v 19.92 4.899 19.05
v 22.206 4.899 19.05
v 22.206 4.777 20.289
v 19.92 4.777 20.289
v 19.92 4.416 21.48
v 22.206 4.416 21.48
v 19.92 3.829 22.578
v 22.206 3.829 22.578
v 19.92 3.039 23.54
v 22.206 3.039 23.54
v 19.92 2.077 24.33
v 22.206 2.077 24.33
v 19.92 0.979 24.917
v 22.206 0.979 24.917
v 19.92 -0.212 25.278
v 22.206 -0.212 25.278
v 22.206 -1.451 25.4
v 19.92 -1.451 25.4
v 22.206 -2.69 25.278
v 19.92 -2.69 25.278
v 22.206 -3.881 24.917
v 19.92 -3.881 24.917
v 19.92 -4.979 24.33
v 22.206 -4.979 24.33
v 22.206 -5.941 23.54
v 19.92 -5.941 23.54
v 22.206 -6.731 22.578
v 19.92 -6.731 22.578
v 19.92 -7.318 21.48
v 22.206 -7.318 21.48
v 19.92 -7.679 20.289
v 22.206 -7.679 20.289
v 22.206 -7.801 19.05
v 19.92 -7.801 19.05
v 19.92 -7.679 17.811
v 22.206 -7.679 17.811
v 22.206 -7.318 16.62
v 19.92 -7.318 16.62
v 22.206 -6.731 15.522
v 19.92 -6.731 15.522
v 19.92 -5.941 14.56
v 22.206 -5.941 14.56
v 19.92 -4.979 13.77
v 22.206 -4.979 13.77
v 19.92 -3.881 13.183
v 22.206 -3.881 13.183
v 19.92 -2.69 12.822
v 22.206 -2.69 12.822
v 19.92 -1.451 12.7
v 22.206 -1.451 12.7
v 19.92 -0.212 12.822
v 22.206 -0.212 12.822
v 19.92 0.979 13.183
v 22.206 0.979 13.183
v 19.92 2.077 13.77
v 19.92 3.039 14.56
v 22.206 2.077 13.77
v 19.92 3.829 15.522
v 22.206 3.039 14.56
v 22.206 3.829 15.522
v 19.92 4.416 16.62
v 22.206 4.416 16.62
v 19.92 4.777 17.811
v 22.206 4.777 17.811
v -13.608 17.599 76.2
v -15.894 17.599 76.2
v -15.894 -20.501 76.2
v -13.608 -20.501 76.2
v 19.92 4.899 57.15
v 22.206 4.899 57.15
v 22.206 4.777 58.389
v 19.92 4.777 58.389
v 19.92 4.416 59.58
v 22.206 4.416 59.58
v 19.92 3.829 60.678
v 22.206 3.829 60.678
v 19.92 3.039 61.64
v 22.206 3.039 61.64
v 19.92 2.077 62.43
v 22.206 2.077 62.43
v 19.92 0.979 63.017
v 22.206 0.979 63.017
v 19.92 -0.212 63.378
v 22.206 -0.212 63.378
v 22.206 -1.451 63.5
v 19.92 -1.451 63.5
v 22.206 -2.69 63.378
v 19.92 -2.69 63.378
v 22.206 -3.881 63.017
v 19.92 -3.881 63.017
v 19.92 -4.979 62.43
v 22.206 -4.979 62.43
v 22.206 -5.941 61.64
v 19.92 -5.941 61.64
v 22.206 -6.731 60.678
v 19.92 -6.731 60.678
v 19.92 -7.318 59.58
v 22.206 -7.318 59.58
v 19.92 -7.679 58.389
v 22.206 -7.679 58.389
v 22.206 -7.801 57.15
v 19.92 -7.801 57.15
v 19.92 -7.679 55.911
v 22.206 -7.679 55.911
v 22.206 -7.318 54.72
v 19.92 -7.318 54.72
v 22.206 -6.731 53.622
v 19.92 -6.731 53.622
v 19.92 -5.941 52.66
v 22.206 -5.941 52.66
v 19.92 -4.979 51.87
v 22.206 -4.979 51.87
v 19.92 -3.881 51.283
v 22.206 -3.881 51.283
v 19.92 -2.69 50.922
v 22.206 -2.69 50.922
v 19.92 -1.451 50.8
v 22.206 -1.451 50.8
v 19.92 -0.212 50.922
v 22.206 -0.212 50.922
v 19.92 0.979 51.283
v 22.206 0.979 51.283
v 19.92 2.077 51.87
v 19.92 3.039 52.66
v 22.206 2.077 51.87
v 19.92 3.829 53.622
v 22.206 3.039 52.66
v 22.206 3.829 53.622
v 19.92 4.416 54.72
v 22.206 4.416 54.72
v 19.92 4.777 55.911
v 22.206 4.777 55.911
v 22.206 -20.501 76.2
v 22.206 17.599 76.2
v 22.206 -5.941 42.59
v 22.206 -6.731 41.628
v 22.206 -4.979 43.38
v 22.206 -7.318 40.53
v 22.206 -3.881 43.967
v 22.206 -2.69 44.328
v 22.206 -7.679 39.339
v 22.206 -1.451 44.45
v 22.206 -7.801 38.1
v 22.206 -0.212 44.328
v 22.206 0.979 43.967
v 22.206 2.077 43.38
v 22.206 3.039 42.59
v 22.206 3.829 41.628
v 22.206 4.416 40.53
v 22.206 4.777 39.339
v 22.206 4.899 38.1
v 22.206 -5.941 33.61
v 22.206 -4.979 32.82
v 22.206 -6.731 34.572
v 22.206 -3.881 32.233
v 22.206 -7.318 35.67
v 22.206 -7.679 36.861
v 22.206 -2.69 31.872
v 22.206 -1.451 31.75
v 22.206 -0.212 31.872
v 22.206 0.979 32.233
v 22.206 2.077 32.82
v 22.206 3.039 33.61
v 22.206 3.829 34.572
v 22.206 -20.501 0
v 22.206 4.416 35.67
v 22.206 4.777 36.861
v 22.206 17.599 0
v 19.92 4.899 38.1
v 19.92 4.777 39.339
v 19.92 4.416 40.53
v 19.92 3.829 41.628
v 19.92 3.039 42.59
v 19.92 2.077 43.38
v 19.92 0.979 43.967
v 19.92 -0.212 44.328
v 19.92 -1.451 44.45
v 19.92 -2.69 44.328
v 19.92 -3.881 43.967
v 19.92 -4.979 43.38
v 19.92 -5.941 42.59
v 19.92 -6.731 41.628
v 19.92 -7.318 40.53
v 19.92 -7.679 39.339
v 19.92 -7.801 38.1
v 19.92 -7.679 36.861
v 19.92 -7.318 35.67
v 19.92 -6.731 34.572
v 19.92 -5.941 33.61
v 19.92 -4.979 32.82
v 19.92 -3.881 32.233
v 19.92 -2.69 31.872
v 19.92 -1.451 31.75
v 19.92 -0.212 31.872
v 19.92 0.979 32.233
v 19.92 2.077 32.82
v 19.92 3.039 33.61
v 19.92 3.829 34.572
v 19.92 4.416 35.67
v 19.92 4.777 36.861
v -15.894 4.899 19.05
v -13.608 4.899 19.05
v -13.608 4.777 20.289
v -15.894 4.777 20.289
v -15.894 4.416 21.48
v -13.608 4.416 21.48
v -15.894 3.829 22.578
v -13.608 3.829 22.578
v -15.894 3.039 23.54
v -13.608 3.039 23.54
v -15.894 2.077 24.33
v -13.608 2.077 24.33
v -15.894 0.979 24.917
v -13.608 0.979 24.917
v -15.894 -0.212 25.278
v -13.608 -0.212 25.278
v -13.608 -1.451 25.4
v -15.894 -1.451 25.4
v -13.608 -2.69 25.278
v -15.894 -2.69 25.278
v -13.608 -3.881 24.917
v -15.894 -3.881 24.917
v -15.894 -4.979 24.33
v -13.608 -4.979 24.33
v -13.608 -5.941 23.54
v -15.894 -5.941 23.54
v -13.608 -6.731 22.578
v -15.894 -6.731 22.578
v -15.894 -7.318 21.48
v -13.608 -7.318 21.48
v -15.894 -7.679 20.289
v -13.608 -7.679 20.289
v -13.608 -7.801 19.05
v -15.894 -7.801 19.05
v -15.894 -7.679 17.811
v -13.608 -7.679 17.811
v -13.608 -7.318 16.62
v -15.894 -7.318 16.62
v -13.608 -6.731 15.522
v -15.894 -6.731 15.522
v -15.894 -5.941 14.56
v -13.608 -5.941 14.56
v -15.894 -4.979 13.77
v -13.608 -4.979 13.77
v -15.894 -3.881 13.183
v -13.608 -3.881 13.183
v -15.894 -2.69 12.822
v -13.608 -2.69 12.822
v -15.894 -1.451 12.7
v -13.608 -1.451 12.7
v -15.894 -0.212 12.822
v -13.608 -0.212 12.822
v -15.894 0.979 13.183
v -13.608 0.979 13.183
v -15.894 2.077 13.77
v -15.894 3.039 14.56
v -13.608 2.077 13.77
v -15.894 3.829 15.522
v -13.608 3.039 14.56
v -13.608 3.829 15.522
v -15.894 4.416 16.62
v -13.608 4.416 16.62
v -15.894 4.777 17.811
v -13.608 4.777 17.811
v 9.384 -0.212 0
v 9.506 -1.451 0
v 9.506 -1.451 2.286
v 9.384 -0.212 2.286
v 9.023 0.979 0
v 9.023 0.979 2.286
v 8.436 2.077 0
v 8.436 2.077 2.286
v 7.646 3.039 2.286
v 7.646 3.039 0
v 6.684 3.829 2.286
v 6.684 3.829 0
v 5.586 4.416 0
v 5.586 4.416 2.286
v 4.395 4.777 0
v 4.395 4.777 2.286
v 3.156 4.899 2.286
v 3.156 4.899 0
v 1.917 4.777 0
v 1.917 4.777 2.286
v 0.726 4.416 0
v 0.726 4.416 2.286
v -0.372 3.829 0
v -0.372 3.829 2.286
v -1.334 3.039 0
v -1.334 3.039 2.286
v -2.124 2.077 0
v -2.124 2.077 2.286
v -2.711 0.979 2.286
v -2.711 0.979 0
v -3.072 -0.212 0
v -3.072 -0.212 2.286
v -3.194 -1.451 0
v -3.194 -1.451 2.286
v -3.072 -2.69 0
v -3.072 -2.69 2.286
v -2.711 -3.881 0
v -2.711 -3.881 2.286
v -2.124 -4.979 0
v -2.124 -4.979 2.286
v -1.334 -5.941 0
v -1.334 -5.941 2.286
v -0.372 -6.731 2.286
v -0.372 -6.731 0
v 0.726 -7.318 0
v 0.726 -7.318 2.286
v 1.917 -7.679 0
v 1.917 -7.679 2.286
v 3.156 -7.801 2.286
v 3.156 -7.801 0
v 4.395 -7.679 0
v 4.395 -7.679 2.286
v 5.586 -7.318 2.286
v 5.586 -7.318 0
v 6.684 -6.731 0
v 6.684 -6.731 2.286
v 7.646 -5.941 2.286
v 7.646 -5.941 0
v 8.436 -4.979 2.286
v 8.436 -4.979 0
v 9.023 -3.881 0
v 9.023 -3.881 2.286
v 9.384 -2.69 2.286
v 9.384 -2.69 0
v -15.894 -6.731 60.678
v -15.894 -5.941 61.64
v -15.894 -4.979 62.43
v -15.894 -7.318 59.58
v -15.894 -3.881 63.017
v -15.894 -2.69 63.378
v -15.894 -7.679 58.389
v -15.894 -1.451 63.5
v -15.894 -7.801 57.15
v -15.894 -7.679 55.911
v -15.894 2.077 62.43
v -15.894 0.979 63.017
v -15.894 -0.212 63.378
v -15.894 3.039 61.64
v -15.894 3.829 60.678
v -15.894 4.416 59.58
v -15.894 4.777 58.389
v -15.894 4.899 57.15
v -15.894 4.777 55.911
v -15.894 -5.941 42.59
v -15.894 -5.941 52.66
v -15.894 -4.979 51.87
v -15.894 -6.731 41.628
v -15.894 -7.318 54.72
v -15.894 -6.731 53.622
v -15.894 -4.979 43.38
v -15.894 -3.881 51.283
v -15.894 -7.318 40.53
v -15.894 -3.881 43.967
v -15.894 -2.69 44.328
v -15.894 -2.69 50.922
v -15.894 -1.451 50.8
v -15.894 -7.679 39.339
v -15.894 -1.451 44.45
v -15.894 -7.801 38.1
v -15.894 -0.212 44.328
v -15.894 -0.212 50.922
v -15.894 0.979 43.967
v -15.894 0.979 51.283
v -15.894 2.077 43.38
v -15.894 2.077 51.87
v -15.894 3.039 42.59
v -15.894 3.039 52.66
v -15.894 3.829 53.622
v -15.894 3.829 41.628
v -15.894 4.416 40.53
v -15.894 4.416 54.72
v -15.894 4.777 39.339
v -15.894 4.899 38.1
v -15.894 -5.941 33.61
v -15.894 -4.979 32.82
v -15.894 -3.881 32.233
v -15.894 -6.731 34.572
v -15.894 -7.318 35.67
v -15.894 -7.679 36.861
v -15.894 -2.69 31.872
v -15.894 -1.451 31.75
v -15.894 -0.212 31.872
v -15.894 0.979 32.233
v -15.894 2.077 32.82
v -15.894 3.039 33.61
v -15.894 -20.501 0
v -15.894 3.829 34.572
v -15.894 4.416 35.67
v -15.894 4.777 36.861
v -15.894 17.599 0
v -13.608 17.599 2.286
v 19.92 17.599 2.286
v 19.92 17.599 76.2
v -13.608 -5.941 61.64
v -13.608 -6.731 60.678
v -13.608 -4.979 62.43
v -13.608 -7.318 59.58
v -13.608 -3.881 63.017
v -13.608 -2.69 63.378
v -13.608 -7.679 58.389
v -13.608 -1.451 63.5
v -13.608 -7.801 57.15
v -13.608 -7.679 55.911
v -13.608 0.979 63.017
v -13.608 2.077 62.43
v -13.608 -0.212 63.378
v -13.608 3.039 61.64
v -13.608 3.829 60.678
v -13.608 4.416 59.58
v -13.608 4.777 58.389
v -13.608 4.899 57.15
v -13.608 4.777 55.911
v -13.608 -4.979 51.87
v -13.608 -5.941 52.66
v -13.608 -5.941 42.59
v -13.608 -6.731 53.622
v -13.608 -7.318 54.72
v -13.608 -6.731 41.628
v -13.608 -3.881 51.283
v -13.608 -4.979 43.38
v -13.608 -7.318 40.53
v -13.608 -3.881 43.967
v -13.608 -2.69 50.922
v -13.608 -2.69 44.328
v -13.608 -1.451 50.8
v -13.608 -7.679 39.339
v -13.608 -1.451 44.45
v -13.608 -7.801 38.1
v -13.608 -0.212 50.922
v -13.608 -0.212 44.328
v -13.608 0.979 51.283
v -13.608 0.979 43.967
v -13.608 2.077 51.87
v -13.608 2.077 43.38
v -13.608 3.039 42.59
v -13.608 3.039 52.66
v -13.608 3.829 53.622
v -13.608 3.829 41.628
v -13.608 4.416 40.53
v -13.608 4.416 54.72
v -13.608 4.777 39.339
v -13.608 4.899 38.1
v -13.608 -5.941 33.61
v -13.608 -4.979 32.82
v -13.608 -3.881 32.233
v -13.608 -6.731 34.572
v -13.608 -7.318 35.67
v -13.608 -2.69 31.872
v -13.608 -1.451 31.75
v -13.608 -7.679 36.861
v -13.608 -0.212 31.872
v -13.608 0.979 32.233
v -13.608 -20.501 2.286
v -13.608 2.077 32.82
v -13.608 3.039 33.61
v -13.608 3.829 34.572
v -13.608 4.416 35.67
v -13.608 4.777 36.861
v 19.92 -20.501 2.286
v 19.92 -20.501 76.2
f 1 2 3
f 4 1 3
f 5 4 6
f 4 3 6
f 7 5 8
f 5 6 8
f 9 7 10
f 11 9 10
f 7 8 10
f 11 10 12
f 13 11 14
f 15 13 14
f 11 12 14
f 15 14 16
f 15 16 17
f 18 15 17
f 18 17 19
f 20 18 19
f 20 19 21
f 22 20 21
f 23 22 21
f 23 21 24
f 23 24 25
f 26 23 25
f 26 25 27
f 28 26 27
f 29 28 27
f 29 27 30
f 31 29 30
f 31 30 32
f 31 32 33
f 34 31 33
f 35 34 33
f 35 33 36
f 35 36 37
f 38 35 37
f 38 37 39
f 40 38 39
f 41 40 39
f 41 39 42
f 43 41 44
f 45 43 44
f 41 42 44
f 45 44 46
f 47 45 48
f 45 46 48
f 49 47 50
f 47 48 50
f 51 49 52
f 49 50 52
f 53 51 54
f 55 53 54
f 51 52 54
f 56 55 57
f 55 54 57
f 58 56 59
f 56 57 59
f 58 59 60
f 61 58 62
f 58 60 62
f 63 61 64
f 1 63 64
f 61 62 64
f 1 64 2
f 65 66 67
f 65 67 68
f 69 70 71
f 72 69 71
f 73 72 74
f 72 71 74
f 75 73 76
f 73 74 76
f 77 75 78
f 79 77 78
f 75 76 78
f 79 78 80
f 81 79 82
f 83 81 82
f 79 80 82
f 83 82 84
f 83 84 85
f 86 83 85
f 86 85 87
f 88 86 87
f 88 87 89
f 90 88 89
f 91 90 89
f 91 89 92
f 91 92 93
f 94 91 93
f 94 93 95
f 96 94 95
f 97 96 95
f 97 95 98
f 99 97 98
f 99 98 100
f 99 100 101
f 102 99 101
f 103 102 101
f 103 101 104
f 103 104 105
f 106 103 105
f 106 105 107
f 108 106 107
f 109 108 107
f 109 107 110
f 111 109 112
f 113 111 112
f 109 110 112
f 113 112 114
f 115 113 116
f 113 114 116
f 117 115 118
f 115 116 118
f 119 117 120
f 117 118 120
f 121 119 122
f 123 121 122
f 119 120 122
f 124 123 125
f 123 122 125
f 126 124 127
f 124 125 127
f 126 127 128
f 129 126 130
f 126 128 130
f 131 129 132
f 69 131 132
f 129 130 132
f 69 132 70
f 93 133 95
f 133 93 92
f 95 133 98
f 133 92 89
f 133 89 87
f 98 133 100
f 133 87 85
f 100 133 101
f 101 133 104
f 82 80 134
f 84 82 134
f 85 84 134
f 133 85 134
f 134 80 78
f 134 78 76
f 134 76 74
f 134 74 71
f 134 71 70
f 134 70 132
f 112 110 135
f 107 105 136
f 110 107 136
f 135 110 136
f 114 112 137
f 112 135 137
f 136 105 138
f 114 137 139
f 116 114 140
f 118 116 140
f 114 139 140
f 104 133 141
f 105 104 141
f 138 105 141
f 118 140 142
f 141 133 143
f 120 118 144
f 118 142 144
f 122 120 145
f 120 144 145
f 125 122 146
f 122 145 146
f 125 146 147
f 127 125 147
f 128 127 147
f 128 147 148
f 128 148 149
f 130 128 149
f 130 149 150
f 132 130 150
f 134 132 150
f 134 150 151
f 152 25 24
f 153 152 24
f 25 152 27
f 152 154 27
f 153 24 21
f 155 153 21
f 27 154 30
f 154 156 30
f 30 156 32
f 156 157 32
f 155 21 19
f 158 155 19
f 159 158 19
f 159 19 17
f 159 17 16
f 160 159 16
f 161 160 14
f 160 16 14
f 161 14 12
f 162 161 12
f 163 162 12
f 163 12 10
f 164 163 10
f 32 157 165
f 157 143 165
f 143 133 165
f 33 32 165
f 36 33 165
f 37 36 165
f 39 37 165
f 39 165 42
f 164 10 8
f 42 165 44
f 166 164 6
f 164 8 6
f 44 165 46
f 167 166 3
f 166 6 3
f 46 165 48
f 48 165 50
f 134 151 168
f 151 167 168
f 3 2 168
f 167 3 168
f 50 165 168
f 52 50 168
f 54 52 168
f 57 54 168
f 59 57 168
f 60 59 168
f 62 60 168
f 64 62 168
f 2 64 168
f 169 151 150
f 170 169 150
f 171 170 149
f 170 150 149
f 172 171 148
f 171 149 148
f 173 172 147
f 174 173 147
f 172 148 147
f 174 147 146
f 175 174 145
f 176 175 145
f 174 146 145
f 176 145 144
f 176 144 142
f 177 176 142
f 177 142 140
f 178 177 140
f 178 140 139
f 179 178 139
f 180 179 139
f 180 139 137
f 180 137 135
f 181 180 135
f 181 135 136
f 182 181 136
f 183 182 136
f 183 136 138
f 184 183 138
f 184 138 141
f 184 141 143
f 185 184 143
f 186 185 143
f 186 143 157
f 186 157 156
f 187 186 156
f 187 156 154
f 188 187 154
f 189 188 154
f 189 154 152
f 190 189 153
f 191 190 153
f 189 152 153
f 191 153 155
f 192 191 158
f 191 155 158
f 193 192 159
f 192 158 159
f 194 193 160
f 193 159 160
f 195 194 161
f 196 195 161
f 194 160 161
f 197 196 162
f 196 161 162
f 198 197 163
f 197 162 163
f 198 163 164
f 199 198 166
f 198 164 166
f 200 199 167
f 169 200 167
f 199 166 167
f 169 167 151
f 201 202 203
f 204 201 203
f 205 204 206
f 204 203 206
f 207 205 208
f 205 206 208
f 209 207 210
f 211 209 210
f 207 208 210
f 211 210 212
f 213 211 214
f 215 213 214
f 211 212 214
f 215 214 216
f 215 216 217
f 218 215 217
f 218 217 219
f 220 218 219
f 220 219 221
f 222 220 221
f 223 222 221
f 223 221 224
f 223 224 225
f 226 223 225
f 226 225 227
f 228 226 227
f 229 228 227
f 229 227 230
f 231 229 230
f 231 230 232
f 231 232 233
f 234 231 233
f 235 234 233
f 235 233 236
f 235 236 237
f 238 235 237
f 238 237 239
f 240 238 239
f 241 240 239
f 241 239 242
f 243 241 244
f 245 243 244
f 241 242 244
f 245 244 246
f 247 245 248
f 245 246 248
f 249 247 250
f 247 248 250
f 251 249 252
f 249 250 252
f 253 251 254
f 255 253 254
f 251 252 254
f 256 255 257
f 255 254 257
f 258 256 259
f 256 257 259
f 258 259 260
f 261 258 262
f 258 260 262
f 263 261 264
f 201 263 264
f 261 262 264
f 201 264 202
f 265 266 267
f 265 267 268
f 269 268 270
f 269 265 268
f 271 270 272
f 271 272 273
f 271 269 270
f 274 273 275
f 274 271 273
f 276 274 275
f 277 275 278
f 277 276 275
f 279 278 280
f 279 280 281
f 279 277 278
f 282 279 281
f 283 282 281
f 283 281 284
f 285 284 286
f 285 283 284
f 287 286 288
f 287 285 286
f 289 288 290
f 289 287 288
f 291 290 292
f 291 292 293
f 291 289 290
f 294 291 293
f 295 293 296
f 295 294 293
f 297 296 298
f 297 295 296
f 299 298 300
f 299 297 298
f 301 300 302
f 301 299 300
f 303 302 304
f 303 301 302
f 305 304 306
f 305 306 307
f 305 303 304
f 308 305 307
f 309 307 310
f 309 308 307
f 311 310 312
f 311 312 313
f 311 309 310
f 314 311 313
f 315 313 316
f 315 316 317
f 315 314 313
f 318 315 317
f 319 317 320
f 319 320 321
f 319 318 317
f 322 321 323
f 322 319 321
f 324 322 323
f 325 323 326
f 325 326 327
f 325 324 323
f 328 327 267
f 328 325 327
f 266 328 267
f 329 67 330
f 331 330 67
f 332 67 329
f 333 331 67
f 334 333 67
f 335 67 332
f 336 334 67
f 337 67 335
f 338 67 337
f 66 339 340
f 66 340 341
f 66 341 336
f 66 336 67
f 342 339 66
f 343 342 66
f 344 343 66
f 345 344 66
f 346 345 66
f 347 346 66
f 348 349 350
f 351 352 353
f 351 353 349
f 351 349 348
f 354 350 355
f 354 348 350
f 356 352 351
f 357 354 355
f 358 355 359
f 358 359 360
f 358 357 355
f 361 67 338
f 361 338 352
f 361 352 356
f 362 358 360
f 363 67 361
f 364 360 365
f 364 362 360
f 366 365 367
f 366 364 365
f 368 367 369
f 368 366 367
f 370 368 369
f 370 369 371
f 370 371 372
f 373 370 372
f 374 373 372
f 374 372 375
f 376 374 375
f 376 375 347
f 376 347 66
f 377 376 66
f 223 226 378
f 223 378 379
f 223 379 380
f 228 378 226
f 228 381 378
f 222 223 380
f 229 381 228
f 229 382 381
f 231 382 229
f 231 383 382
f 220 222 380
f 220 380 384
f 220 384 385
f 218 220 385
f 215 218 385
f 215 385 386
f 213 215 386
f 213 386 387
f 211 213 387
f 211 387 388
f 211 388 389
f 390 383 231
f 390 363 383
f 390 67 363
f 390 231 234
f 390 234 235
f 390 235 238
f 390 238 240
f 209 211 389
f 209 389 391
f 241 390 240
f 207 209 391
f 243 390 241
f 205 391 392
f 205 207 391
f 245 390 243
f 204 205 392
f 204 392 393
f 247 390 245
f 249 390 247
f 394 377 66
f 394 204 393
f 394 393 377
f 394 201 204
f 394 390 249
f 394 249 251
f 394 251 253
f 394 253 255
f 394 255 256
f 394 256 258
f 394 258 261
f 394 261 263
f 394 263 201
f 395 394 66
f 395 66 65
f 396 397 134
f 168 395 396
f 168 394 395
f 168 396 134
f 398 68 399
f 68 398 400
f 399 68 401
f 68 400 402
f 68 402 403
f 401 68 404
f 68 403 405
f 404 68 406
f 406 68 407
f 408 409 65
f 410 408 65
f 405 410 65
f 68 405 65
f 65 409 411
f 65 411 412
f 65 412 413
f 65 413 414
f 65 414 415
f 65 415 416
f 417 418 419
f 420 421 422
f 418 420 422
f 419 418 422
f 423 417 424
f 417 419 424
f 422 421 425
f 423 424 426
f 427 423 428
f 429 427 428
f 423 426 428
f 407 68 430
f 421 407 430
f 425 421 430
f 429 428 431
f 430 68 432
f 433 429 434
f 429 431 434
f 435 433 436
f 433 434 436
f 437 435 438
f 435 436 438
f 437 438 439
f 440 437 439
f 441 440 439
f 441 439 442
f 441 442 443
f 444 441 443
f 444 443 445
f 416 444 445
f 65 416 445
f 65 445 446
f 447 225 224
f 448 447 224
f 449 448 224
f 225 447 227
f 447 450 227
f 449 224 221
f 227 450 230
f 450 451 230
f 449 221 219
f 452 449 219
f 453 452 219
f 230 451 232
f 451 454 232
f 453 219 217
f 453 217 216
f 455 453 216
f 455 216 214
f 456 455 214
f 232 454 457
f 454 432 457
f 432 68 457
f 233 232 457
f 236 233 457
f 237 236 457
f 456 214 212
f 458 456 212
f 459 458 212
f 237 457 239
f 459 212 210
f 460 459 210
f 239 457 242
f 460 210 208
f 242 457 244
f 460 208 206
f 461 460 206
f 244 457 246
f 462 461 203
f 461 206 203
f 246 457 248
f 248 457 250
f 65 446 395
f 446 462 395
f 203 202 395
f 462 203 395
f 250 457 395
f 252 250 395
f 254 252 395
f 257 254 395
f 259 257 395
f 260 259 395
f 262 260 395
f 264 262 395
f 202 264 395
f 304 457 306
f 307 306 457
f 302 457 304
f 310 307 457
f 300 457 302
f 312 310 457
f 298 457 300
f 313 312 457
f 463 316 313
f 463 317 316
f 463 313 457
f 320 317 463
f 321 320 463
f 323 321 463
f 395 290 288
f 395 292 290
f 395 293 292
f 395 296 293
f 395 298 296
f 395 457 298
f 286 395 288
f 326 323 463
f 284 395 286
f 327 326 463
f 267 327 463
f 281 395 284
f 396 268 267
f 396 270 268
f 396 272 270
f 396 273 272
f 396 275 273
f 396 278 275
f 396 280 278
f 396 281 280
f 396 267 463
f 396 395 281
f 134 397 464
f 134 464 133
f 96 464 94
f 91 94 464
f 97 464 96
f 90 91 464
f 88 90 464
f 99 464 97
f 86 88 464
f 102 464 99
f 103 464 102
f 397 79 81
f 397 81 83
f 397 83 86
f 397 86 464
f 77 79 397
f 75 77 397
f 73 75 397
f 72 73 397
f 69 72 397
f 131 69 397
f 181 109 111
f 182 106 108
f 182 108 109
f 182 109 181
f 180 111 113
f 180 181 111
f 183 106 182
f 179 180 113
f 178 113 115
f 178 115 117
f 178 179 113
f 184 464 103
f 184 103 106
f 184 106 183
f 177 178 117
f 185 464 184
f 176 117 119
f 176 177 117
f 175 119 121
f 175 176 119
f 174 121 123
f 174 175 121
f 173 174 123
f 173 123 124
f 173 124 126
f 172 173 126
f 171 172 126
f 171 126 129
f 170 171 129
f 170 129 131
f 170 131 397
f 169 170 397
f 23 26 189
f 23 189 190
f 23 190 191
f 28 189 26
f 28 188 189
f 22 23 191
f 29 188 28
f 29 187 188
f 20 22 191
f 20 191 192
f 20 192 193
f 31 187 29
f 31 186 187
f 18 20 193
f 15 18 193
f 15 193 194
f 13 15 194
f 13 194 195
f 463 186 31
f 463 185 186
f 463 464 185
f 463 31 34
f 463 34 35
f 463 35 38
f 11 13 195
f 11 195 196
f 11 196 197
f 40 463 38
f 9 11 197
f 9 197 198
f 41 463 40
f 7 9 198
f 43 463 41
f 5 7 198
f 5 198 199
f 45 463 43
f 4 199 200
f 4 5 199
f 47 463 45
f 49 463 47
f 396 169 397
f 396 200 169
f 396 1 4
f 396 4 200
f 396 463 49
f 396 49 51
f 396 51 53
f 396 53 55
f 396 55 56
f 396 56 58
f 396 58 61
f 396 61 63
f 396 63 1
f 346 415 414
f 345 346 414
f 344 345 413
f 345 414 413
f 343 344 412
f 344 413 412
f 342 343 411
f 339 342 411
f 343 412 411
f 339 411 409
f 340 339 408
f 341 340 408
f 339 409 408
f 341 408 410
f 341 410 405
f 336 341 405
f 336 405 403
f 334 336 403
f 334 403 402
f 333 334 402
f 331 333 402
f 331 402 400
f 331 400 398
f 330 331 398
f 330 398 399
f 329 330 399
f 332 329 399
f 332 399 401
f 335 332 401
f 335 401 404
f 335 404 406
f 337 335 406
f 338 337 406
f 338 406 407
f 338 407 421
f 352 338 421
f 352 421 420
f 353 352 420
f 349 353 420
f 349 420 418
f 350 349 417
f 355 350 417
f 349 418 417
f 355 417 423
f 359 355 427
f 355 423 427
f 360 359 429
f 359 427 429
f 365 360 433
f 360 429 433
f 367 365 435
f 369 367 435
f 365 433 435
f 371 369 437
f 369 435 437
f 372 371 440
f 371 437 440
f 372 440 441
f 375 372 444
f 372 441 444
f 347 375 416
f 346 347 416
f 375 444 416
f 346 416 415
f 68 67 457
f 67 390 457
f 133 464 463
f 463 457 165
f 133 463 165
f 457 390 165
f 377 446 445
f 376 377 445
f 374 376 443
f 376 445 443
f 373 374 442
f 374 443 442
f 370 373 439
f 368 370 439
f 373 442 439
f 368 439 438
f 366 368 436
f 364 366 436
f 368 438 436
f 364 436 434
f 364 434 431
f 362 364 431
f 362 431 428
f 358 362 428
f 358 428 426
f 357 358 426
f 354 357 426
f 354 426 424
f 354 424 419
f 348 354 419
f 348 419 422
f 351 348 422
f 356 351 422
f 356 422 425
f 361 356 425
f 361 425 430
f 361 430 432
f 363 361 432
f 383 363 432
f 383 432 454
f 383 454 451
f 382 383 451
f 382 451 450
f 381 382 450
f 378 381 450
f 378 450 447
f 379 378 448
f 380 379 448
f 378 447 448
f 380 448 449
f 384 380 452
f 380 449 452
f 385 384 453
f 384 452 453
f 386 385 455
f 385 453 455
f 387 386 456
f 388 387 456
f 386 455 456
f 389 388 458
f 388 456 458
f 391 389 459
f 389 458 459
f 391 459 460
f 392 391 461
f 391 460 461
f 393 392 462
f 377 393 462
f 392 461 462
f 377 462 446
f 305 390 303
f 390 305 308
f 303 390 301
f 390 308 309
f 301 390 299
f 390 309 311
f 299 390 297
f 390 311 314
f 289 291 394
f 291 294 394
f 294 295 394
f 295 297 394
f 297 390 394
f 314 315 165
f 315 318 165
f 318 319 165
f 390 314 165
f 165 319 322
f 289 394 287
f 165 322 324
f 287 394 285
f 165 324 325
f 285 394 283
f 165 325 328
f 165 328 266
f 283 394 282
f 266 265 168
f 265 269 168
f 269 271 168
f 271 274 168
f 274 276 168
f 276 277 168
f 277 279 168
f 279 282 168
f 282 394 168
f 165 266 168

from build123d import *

# Parameters (mm, degrees)
F0_W     = 2.286
F0_H     = 38.1
F0_W_2   = 33.528
F0_R     = 6.35
F1_DEPTH = 2.286
F2_W     = 2.286
F2_H     = 38.1
F3_DEPTH = 73.914
F4_R     = 6.35
F5_DEPTH = 38.101


with BuildPart() as f1:
    # F0 (on Top) → F1 (new body)
    with BuildSketch(Plane.XY):
        with Locations((-14.750999, -1.450934)):
            Rectangle(F0_W, F0_H)
        with Locations((3.156001, -1.450934)):
            Rectangle(F0_W_2, F0_H)
        with Locations((3.156001, -1.450934)):
            Circle(F0_R, mode=Mode.SUBTRACT)
        with Locations((21.063001, -1.450934)):
            Rectangle(F0_W, F0_H)
    extrude(amount=F1_DEPTH)

    # F2 (on face) → F3 (join)
    with BuildSketch(Plane.XY.offset(2.286)):
        with Locations((-14.750999, -1.450934)):
            Rectangle(F2_W, F2_H)
        with Locations((21.063001, -1.450934)):
            Rectangle(F2_W, F2_H)
    extrude(amount=F3_DEPTH)

    # F4 (on face) → F5 (cut, through all)
    with BuildSketch(Plane.YZ.offset(22.206001)):
        with Locations((-1.450934, 57.15)):
            Circle(F4_R)
        with Locations((-1.450934, 38.1)):
            Circle(F4_R)
        with Locations((-1.450934, 19.05)):
            Circle(F4_R)
    extrude(amount=-F5_DEPTH, mode=Mode.SUBTRACT)


solid = f1.part
